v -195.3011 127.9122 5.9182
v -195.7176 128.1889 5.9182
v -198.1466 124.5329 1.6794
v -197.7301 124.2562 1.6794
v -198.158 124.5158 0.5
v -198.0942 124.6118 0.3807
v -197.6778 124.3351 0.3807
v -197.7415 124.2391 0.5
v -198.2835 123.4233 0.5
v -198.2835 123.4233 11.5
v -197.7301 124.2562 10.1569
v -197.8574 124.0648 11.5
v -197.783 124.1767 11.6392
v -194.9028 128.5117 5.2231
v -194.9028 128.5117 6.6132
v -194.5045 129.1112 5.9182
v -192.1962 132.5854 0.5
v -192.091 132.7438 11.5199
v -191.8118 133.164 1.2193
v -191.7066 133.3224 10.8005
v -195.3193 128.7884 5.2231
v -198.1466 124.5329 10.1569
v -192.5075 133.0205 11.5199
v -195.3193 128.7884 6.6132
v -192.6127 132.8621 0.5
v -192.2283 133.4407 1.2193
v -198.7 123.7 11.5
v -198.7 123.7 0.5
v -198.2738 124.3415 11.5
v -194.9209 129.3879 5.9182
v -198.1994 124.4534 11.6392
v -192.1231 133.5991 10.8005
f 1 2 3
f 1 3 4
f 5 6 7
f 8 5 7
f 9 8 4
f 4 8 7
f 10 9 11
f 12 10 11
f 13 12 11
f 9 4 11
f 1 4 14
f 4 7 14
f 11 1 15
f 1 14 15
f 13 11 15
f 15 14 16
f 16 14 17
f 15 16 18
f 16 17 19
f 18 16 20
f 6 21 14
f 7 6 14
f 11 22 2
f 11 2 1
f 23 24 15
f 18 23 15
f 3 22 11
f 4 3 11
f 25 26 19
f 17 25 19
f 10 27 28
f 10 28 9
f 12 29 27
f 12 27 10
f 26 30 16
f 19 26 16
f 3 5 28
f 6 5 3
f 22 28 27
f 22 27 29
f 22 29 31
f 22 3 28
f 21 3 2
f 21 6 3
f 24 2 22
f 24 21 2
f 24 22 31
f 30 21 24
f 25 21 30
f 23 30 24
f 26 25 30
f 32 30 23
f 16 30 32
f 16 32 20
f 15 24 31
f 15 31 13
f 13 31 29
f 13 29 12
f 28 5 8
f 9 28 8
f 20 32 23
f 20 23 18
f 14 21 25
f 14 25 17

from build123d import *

# Parameters (mm, degrees)
BOX229_W                  = 0.5
BOX229_H                  = 1
BOX229_DEPTH              = 15
BOX229_ROLL_ANGLE         = 46
BOX230_W                  = 0.5
BOX230_H                  = 1
BOX230_DEPTH              = 15
BOX230_ROLL_ANGLE         = -46
BOX227_W                  = 0.5
BOX227_H                  = 1
BOX227_DEPTH              = 11
FUSION019_PLACEMENT_ANGLE = -33.6


with BuildPart() as cubo229:
    # Box229 → Box229 (new body)
    with BuildSketch(Plane.XY):
        with Locations((0.25, 0.5)):
            Rectangle(BOX229_W, BOX229_H)
    extrude(amount=BOX229_DEPTH)


with BuildPart() as cubo229_1:
    # Box229 roll: moved
    add(cubo229.part.rotate(Axis((0, 0, 0), (1, 0, 0)), BOX229_ROLL_ANGLE))


with BuildPart() as cubo229_2:
    # Box229 placement: moved
    add(cubo229_1.part.moved(Location((0, 11, 0.5))))


with BuildPart() as cubo230:
    # Box230 → Box230 (new body)
    with BuildSketch(Plane.XY):
        with Locations((0.25, 0.5)):
            Rectangle(BOX230_W, BOX230_H)
    extrude(amount=BOX230_DEPTH)


with BuildPart() as cubo230_1:
    # Box230 roll: moved
    add(cubo230.part.rotate(Axis((0, 0, 0), (1, 0, 0)), BOX230_ROLL_ANGLE))


with BuildPart() as cubo230_2:
    # Box230 placement: moved
    add(cubo230_1.part.moved(Location((0, 0.4, 1.1))))


with BuildPart() as fusion019:
    # Box227 → Box227 (new body)
    with BuildSketch(Plane.XY.offset(0.5)):
        with Locations((0.25, 0.5)):
            Rectangle(BOX227_W, BOX227_H)
    extrude(amount=BOX227_DEPTH)

    # Fusion019: union Cubo229, Cubo230
    add(cubo229_2.part)
    add(cubo230_2.part)


with BuildPart() as fusion019_1:
    # Fusion019 placement: moved
    add(fusion019.part.moved(Location((-198.7, 123.7, 0))).rotate(Axis((-198.7, 123.7, 0), (0, 0, 1)), FUSION019_PLACEMENT_ANGLE))


solid = fusion019_1.part
